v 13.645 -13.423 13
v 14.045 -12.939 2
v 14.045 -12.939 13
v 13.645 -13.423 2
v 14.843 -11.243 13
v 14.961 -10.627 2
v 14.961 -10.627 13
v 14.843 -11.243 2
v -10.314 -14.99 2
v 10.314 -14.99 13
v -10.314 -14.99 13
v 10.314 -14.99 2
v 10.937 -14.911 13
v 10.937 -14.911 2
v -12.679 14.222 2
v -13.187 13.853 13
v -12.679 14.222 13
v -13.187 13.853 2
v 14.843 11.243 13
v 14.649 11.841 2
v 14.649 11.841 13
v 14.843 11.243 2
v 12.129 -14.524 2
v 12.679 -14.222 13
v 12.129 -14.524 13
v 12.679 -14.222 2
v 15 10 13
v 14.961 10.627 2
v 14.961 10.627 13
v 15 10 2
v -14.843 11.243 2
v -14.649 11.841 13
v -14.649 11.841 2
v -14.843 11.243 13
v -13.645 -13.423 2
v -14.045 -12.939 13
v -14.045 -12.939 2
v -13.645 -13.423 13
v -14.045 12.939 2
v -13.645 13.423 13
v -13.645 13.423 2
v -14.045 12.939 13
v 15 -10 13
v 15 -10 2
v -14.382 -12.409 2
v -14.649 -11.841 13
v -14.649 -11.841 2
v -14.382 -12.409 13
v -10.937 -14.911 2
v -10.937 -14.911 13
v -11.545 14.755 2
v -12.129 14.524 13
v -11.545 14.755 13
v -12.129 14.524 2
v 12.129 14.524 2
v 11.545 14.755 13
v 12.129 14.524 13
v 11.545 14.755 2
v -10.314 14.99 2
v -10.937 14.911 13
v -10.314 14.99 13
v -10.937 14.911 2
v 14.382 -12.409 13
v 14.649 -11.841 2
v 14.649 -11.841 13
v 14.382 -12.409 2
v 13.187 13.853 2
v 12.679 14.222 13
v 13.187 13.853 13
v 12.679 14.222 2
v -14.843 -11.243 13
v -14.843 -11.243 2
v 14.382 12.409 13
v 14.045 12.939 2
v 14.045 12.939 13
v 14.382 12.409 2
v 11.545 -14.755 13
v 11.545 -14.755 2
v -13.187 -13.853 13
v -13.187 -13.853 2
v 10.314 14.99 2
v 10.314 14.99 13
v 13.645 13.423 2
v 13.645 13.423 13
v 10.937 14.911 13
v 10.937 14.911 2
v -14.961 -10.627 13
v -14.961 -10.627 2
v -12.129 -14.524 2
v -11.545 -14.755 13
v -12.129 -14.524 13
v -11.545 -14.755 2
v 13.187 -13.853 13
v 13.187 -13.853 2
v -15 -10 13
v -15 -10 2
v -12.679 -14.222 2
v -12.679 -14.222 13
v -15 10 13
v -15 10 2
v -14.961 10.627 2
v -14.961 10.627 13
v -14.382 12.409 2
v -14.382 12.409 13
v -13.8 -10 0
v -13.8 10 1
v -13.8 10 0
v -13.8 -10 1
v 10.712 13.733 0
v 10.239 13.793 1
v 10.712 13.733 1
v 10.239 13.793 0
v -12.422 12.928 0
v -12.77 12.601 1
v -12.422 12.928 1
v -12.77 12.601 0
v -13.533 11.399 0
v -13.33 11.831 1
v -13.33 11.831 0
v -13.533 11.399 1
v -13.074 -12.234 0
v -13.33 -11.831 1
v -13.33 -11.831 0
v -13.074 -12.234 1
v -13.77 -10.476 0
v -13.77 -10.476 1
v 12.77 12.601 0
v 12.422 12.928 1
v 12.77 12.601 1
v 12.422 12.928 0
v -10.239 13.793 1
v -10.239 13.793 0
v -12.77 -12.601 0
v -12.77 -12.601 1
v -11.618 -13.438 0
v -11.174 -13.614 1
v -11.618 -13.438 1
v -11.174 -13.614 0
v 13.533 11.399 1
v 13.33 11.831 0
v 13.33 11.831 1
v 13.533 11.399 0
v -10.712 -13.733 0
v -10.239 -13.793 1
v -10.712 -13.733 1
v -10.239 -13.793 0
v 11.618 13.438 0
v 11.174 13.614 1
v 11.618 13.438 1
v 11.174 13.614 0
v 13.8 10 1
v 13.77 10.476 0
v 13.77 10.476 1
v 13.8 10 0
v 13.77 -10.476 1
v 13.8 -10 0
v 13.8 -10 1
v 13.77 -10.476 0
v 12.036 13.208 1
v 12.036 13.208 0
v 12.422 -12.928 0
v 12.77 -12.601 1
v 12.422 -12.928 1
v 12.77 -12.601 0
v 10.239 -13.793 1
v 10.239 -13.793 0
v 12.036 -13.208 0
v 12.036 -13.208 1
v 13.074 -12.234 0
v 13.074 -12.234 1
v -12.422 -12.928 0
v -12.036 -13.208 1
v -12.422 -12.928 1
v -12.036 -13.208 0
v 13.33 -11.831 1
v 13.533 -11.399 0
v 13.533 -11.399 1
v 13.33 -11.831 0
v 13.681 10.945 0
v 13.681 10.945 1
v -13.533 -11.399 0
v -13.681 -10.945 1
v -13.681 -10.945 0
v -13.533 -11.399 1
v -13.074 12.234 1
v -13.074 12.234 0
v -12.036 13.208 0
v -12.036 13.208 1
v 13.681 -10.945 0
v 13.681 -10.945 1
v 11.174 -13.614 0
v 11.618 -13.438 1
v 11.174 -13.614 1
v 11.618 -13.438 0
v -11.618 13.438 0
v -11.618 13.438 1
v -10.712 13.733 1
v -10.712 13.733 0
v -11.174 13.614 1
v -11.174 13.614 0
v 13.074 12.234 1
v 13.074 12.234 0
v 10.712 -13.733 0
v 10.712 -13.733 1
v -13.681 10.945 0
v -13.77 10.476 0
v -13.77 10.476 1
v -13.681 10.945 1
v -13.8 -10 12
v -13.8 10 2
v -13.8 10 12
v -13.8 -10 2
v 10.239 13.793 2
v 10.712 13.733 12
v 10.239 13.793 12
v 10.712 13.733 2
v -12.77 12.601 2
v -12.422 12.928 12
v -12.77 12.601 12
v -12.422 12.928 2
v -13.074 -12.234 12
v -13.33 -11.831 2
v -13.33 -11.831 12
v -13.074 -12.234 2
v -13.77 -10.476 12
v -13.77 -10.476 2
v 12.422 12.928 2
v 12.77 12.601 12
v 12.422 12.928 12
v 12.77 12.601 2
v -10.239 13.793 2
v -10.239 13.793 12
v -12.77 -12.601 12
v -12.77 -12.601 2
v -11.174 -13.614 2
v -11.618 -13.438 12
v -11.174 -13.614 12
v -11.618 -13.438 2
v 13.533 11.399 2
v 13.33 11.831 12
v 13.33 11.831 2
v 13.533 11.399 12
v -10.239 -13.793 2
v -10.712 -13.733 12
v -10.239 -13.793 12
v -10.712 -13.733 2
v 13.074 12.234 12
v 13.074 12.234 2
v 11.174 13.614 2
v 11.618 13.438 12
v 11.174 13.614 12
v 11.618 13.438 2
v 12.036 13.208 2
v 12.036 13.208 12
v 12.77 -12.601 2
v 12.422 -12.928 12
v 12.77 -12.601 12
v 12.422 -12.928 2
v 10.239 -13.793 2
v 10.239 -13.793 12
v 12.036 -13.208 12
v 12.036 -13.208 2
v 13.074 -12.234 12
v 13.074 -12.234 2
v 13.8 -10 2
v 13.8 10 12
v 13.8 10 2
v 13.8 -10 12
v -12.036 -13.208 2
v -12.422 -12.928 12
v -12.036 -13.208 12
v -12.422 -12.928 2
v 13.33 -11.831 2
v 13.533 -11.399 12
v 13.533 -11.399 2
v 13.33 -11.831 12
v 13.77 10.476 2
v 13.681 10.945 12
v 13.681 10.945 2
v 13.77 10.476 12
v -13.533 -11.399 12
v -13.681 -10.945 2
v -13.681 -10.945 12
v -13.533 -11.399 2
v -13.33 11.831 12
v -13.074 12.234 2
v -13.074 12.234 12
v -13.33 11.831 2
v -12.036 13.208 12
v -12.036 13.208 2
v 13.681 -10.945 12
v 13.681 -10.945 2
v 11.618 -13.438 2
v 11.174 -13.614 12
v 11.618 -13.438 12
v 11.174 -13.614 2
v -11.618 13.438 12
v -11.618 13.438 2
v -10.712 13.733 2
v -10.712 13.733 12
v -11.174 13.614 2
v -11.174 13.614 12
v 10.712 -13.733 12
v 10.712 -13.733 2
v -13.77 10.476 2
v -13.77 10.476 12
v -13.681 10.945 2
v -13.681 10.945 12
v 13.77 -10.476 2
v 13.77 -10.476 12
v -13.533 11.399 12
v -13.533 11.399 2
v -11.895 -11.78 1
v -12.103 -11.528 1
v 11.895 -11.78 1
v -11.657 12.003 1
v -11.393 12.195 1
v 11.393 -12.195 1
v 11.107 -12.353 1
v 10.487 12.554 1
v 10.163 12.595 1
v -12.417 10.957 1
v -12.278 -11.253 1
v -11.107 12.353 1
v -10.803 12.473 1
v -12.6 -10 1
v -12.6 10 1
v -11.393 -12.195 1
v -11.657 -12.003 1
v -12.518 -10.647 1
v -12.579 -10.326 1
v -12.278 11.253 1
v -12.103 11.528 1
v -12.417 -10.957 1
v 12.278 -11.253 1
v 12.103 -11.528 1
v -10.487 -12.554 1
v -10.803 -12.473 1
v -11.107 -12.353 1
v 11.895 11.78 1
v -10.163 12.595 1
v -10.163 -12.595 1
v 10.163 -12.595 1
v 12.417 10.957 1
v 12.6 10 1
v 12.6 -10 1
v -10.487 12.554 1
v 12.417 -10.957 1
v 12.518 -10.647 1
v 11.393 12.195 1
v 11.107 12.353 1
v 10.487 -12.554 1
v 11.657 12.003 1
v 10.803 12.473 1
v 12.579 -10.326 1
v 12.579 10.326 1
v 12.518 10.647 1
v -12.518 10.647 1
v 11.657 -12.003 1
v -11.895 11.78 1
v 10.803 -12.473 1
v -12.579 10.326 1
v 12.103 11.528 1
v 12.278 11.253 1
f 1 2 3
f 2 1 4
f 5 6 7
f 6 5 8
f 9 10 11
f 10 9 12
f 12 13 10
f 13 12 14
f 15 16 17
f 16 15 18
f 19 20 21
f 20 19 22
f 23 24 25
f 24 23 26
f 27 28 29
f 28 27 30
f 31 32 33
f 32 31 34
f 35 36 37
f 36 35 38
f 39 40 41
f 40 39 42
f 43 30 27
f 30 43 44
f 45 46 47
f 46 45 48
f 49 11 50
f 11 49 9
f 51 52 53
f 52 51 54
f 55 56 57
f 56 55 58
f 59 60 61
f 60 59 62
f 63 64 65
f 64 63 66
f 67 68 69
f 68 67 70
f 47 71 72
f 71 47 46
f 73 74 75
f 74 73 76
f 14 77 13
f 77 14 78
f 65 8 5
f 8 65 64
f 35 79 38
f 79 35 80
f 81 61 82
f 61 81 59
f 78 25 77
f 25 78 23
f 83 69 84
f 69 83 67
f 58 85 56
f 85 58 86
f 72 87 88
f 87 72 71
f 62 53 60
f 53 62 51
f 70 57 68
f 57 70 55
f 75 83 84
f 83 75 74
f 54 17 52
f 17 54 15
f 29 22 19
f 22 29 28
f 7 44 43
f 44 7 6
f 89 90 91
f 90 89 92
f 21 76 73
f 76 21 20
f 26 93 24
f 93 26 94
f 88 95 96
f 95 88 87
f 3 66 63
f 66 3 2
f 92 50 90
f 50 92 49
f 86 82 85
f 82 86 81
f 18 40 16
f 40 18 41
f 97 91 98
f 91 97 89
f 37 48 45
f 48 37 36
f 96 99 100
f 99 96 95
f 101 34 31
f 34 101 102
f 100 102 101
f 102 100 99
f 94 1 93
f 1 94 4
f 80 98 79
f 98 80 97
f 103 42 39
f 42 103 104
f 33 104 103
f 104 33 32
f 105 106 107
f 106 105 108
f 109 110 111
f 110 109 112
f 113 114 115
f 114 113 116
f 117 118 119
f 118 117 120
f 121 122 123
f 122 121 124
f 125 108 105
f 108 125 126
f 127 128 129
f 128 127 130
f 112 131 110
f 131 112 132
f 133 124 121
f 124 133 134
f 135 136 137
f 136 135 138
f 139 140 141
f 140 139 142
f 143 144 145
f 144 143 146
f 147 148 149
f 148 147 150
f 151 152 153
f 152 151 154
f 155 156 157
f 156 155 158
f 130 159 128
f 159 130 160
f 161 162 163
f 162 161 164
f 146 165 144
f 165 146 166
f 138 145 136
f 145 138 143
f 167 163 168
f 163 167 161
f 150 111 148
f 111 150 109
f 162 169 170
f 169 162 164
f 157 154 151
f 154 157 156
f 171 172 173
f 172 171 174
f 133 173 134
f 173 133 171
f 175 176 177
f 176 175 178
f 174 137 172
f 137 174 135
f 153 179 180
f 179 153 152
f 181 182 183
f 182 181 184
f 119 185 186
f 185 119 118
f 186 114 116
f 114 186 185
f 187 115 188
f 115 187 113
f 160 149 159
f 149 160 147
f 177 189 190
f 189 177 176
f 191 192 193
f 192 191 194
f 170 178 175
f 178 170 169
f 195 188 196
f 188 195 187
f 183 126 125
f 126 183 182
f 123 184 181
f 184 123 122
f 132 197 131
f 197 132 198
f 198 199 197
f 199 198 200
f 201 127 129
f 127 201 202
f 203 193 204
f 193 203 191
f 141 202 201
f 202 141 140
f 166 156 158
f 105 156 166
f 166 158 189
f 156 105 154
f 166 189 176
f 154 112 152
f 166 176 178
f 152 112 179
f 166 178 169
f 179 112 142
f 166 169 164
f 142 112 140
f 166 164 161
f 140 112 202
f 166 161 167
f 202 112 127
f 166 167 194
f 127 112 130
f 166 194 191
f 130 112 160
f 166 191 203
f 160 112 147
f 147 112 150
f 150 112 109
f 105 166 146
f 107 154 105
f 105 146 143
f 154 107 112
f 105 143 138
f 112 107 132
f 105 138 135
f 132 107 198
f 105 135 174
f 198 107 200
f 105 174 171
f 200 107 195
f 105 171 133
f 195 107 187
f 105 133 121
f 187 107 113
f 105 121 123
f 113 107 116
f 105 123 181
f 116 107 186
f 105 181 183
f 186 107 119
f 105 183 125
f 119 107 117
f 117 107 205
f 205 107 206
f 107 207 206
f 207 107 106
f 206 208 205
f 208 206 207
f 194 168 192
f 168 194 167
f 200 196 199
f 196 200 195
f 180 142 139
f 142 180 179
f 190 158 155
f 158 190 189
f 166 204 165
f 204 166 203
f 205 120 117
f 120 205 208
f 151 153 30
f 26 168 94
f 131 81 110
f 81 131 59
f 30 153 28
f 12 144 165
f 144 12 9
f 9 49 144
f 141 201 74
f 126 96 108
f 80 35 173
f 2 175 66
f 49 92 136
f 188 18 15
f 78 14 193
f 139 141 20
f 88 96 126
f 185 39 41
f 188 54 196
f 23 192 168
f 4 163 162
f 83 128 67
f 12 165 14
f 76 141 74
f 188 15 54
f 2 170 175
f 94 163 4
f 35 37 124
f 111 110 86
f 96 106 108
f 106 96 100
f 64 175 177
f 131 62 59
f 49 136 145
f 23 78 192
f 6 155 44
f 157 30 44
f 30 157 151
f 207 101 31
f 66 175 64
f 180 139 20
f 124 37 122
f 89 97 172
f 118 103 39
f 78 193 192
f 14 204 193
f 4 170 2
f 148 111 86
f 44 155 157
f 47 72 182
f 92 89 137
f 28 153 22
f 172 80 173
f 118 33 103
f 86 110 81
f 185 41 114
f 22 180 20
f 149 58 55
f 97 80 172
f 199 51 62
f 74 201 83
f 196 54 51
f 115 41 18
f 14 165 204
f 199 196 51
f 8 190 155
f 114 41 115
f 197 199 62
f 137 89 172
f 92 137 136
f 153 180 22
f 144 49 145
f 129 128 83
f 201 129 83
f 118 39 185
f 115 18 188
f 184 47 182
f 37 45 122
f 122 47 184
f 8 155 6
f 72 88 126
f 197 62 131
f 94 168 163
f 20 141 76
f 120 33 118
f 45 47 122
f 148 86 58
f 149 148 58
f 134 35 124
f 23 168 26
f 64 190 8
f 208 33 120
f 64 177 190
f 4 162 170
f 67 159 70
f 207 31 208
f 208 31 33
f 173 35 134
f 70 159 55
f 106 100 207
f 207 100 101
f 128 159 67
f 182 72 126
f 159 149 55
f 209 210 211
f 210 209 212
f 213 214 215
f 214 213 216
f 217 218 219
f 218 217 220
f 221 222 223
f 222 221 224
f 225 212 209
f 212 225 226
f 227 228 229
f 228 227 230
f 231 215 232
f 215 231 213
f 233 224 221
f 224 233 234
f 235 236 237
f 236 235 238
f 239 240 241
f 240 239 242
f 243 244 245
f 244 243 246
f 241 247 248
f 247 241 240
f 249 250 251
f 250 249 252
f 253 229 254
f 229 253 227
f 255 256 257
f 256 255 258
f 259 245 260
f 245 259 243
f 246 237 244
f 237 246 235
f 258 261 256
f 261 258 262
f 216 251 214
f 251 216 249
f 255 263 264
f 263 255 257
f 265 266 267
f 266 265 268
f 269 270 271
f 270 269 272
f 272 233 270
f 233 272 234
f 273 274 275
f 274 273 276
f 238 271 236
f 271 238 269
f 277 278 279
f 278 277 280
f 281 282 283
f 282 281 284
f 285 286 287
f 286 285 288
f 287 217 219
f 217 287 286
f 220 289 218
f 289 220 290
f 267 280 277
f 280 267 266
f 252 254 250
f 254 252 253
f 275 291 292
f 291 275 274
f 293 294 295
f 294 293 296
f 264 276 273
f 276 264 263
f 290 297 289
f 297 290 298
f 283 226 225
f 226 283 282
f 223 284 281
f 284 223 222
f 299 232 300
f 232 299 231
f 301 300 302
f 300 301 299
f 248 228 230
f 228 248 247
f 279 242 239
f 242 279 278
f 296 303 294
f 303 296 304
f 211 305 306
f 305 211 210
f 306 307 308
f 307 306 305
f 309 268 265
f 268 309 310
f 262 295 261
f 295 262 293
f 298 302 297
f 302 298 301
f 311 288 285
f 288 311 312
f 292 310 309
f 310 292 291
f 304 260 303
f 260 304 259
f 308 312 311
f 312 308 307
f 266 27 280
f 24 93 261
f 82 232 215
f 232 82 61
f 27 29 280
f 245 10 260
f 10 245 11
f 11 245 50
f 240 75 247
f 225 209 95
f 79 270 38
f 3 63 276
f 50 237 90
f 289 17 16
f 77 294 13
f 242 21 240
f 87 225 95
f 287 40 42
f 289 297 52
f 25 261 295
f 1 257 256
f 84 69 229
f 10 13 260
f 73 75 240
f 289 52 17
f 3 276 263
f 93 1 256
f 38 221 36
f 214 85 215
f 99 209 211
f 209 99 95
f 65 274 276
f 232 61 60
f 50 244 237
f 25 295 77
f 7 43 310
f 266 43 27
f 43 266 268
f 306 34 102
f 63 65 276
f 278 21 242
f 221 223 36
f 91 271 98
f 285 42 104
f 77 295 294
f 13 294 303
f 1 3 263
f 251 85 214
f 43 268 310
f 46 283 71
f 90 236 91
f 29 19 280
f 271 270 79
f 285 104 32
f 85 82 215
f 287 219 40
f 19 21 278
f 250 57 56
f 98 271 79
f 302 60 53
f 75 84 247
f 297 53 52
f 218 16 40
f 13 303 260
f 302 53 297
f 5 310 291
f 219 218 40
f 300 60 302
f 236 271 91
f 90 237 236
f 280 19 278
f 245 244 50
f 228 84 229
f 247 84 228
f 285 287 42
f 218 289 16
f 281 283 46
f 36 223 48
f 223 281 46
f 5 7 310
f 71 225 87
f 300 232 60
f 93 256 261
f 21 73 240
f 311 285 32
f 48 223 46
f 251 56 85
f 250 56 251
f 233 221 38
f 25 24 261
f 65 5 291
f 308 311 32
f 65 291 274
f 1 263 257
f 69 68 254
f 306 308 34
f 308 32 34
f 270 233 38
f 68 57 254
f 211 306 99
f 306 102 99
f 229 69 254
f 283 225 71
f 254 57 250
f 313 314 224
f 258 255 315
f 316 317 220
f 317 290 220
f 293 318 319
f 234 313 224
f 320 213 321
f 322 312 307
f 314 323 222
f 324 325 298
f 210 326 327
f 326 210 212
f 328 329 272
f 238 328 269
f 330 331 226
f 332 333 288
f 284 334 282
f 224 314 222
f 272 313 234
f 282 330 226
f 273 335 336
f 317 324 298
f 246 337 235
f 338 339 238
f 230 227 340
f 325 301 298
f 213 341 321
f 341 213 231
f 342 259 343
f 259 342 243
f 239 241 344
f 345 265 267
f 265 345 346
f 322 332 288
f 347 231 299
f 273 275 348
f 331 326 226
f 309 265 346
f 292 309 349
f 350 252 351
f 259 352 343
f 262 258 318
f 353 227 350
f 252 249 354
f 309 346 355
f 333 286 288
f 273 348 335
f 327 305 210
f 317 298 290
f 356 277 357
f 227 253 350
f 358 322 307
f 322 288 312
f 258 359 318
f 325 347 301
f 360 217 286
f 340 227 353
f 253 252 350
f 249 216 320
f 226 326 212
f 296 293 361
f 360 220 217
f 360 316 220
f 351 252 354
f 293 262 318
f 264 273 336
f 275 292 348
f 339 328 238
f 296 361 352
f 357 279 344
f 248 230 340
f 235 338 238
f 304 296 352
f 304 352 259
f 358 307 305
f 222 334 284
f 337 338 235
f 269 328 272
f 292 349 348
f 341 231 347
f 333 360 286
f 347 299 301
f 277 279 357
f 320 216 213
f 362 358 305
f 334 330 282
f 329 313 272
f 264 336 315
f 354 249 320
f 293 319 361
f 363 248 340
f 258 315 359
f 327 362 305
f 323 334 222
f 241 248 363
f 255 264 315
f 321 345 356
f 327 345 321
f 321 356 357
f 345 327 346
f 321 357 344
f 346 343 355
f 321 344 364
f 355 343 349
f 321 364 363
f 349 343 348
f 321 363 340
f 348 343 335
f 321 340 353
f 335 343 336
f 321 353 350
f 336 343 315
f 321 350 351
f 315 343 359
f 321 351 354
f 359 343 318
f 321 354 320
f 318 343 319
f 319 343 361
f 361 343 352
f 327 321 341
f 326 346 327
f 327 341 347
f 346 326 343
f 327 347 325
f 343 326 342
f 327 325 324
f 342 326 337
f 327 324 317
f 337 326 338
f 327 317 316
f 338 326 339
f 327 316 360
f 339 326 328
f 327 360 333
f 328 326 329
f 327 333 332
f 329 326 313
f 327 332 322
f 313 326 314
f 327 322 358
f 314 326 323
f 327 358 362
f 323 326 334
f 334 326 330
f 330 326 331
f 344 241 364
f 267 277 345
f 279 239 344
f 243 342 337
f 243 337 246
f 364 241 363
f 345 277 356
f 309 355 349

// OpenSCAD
$fn = 50;


difference() {
	union() {
		translate(v = [0, 0, 2]) {
			hull() {
				translate(v = [-10.0000000000, 10.0000000000, 0]) {
					cylinder(h = 11, r = 5);
				}
				translate(v = [10.0000000000, 10.0000000000, 0]) {
					cylinder(h = 11, r = 5);
				}
				translate(v = [-10.0000000000, -10.0000000000, 0]) {
					cylinder(h = 11, r = 5);
				}
				translate(v = [10.0000000000, -10.0000000000, 0]) {
					cylinder(h = 11, r = 5);
				}
			}
		}
		hull() {
			translate(v = [-10.0000000000, 10.0000000000, 0]) {
				cylinder(h = 1, r = 3.8000000000);
			}
			translate(v = [10.0000000000, 10.0000000000, 0]) {
				cylinder(h = 1, r = 3.8000000000);
			}
			translate(v = [-10.0000000000, -10.0000000000, 0]) {
				cylinder(h = 1, r = 3.8000000000);
			}
			translate(v = [10.0000000000, -10.0000000000, 0]) {
				cylinder(h = 1, r = 3.8000000000);
			}
		}
		translate(v = [0, 0, 1]) {
			hull() {
				translate(v = [-10.0000000000, 10.0000000000, 0]) {
					cylinder(h = 1, r1 = 3.8000000000, r2 = 5.0000000000);
				}
				translate(v = [10.0000000000, 10.0000000000, 0]) {
					cylinder(h = 1, r1 = 3.8000000000, r2 = 5.0000000000);
				}
				translate(v = [-10.0000000000, -10.0000000000, 0]) {
					cylinder(h = 1, r1 = 3.8000000000, r2 = 5.0000000000);
				}
				translate(v = [10.0000000000, -10.0000000000, 0]) {
					cylinder(h = 1, r1 = 3.8000000000, r2 = 5.0000000000);
				}
			}
		}
	}
	union() {
		translate(v = [0, 0, 2]) {
			#hull() {
				translate(v = [-10.0000000000, 10.0000000000, 0]) {
					cylinder(h = 11, r = 3.8000000000);
				}
				translate(v = [10.0000000000, 10.0000000000, 0]) {
					cylinder(h = 11, r = 3.8000000000);
				}
				translate(v = [-10.0000000000, -10.0000000000, 0]) {
					cylinder(h = 11, r = 3.8000000000);
				}
				translate(v = [10.0000000000, -10.0000000000, 0]) {
					cylinder(h = 11, r = 3.8000000000);
				}
			}
		}
		translate(v = [0, 0, 12]) {
			hull() {
				translate(v = [-10.0000000000, 10.0000000000, 0]) {
					cylinder(h = 1, r1 = 3.8000000000, r2 = 5.0000000000);
				}
				translate(v = [10.0000000000, 10.0000000000, 0]) {
					cylinder(h = 1, r1 = 3.8000000000, r2 = 5.0000000000);
				}
				translate(v = [-10.0000000000, -10.0000000000, 0]) {
					cylinder(h = 1, r1 = 3.8000000000, r2 = 5.0000000000);
				}
				translate(v = [10.0000000000, -10.0000000000, 0]) {
					cylinder(h = 1, r1 = 3.8000000000, r2 = 5.0000000000);
				}
			}
		}
		translate(v = [0, 0, 1]) {
			#hull() {
				translate(v = [-10.0000000000, 10.0000000000, 0]) {
					cylinder(h = 1, r1 = 2.6000000000, r2 = 3.8000000000);
				}
				translate(v = [10.0000000000, 10.0000000000, 0]) {
					cylinder(h = 1, r1 = 2.6000000000, r2 = 3.8000000000);
				}
				translate(v = [-10.0000000000, -10.0000000000, 0]) {
					cylinder(h = 1, r1 = 2.6000000000, r2 = 3.8000000000);
				}
				translate(v = [10.0000000000, -10.0000000000, 0]) {
					cylinder(h = 1, r1 = 2.6000000000, r2 = 3.8000000000);
				}
			}
		}
	}
}
